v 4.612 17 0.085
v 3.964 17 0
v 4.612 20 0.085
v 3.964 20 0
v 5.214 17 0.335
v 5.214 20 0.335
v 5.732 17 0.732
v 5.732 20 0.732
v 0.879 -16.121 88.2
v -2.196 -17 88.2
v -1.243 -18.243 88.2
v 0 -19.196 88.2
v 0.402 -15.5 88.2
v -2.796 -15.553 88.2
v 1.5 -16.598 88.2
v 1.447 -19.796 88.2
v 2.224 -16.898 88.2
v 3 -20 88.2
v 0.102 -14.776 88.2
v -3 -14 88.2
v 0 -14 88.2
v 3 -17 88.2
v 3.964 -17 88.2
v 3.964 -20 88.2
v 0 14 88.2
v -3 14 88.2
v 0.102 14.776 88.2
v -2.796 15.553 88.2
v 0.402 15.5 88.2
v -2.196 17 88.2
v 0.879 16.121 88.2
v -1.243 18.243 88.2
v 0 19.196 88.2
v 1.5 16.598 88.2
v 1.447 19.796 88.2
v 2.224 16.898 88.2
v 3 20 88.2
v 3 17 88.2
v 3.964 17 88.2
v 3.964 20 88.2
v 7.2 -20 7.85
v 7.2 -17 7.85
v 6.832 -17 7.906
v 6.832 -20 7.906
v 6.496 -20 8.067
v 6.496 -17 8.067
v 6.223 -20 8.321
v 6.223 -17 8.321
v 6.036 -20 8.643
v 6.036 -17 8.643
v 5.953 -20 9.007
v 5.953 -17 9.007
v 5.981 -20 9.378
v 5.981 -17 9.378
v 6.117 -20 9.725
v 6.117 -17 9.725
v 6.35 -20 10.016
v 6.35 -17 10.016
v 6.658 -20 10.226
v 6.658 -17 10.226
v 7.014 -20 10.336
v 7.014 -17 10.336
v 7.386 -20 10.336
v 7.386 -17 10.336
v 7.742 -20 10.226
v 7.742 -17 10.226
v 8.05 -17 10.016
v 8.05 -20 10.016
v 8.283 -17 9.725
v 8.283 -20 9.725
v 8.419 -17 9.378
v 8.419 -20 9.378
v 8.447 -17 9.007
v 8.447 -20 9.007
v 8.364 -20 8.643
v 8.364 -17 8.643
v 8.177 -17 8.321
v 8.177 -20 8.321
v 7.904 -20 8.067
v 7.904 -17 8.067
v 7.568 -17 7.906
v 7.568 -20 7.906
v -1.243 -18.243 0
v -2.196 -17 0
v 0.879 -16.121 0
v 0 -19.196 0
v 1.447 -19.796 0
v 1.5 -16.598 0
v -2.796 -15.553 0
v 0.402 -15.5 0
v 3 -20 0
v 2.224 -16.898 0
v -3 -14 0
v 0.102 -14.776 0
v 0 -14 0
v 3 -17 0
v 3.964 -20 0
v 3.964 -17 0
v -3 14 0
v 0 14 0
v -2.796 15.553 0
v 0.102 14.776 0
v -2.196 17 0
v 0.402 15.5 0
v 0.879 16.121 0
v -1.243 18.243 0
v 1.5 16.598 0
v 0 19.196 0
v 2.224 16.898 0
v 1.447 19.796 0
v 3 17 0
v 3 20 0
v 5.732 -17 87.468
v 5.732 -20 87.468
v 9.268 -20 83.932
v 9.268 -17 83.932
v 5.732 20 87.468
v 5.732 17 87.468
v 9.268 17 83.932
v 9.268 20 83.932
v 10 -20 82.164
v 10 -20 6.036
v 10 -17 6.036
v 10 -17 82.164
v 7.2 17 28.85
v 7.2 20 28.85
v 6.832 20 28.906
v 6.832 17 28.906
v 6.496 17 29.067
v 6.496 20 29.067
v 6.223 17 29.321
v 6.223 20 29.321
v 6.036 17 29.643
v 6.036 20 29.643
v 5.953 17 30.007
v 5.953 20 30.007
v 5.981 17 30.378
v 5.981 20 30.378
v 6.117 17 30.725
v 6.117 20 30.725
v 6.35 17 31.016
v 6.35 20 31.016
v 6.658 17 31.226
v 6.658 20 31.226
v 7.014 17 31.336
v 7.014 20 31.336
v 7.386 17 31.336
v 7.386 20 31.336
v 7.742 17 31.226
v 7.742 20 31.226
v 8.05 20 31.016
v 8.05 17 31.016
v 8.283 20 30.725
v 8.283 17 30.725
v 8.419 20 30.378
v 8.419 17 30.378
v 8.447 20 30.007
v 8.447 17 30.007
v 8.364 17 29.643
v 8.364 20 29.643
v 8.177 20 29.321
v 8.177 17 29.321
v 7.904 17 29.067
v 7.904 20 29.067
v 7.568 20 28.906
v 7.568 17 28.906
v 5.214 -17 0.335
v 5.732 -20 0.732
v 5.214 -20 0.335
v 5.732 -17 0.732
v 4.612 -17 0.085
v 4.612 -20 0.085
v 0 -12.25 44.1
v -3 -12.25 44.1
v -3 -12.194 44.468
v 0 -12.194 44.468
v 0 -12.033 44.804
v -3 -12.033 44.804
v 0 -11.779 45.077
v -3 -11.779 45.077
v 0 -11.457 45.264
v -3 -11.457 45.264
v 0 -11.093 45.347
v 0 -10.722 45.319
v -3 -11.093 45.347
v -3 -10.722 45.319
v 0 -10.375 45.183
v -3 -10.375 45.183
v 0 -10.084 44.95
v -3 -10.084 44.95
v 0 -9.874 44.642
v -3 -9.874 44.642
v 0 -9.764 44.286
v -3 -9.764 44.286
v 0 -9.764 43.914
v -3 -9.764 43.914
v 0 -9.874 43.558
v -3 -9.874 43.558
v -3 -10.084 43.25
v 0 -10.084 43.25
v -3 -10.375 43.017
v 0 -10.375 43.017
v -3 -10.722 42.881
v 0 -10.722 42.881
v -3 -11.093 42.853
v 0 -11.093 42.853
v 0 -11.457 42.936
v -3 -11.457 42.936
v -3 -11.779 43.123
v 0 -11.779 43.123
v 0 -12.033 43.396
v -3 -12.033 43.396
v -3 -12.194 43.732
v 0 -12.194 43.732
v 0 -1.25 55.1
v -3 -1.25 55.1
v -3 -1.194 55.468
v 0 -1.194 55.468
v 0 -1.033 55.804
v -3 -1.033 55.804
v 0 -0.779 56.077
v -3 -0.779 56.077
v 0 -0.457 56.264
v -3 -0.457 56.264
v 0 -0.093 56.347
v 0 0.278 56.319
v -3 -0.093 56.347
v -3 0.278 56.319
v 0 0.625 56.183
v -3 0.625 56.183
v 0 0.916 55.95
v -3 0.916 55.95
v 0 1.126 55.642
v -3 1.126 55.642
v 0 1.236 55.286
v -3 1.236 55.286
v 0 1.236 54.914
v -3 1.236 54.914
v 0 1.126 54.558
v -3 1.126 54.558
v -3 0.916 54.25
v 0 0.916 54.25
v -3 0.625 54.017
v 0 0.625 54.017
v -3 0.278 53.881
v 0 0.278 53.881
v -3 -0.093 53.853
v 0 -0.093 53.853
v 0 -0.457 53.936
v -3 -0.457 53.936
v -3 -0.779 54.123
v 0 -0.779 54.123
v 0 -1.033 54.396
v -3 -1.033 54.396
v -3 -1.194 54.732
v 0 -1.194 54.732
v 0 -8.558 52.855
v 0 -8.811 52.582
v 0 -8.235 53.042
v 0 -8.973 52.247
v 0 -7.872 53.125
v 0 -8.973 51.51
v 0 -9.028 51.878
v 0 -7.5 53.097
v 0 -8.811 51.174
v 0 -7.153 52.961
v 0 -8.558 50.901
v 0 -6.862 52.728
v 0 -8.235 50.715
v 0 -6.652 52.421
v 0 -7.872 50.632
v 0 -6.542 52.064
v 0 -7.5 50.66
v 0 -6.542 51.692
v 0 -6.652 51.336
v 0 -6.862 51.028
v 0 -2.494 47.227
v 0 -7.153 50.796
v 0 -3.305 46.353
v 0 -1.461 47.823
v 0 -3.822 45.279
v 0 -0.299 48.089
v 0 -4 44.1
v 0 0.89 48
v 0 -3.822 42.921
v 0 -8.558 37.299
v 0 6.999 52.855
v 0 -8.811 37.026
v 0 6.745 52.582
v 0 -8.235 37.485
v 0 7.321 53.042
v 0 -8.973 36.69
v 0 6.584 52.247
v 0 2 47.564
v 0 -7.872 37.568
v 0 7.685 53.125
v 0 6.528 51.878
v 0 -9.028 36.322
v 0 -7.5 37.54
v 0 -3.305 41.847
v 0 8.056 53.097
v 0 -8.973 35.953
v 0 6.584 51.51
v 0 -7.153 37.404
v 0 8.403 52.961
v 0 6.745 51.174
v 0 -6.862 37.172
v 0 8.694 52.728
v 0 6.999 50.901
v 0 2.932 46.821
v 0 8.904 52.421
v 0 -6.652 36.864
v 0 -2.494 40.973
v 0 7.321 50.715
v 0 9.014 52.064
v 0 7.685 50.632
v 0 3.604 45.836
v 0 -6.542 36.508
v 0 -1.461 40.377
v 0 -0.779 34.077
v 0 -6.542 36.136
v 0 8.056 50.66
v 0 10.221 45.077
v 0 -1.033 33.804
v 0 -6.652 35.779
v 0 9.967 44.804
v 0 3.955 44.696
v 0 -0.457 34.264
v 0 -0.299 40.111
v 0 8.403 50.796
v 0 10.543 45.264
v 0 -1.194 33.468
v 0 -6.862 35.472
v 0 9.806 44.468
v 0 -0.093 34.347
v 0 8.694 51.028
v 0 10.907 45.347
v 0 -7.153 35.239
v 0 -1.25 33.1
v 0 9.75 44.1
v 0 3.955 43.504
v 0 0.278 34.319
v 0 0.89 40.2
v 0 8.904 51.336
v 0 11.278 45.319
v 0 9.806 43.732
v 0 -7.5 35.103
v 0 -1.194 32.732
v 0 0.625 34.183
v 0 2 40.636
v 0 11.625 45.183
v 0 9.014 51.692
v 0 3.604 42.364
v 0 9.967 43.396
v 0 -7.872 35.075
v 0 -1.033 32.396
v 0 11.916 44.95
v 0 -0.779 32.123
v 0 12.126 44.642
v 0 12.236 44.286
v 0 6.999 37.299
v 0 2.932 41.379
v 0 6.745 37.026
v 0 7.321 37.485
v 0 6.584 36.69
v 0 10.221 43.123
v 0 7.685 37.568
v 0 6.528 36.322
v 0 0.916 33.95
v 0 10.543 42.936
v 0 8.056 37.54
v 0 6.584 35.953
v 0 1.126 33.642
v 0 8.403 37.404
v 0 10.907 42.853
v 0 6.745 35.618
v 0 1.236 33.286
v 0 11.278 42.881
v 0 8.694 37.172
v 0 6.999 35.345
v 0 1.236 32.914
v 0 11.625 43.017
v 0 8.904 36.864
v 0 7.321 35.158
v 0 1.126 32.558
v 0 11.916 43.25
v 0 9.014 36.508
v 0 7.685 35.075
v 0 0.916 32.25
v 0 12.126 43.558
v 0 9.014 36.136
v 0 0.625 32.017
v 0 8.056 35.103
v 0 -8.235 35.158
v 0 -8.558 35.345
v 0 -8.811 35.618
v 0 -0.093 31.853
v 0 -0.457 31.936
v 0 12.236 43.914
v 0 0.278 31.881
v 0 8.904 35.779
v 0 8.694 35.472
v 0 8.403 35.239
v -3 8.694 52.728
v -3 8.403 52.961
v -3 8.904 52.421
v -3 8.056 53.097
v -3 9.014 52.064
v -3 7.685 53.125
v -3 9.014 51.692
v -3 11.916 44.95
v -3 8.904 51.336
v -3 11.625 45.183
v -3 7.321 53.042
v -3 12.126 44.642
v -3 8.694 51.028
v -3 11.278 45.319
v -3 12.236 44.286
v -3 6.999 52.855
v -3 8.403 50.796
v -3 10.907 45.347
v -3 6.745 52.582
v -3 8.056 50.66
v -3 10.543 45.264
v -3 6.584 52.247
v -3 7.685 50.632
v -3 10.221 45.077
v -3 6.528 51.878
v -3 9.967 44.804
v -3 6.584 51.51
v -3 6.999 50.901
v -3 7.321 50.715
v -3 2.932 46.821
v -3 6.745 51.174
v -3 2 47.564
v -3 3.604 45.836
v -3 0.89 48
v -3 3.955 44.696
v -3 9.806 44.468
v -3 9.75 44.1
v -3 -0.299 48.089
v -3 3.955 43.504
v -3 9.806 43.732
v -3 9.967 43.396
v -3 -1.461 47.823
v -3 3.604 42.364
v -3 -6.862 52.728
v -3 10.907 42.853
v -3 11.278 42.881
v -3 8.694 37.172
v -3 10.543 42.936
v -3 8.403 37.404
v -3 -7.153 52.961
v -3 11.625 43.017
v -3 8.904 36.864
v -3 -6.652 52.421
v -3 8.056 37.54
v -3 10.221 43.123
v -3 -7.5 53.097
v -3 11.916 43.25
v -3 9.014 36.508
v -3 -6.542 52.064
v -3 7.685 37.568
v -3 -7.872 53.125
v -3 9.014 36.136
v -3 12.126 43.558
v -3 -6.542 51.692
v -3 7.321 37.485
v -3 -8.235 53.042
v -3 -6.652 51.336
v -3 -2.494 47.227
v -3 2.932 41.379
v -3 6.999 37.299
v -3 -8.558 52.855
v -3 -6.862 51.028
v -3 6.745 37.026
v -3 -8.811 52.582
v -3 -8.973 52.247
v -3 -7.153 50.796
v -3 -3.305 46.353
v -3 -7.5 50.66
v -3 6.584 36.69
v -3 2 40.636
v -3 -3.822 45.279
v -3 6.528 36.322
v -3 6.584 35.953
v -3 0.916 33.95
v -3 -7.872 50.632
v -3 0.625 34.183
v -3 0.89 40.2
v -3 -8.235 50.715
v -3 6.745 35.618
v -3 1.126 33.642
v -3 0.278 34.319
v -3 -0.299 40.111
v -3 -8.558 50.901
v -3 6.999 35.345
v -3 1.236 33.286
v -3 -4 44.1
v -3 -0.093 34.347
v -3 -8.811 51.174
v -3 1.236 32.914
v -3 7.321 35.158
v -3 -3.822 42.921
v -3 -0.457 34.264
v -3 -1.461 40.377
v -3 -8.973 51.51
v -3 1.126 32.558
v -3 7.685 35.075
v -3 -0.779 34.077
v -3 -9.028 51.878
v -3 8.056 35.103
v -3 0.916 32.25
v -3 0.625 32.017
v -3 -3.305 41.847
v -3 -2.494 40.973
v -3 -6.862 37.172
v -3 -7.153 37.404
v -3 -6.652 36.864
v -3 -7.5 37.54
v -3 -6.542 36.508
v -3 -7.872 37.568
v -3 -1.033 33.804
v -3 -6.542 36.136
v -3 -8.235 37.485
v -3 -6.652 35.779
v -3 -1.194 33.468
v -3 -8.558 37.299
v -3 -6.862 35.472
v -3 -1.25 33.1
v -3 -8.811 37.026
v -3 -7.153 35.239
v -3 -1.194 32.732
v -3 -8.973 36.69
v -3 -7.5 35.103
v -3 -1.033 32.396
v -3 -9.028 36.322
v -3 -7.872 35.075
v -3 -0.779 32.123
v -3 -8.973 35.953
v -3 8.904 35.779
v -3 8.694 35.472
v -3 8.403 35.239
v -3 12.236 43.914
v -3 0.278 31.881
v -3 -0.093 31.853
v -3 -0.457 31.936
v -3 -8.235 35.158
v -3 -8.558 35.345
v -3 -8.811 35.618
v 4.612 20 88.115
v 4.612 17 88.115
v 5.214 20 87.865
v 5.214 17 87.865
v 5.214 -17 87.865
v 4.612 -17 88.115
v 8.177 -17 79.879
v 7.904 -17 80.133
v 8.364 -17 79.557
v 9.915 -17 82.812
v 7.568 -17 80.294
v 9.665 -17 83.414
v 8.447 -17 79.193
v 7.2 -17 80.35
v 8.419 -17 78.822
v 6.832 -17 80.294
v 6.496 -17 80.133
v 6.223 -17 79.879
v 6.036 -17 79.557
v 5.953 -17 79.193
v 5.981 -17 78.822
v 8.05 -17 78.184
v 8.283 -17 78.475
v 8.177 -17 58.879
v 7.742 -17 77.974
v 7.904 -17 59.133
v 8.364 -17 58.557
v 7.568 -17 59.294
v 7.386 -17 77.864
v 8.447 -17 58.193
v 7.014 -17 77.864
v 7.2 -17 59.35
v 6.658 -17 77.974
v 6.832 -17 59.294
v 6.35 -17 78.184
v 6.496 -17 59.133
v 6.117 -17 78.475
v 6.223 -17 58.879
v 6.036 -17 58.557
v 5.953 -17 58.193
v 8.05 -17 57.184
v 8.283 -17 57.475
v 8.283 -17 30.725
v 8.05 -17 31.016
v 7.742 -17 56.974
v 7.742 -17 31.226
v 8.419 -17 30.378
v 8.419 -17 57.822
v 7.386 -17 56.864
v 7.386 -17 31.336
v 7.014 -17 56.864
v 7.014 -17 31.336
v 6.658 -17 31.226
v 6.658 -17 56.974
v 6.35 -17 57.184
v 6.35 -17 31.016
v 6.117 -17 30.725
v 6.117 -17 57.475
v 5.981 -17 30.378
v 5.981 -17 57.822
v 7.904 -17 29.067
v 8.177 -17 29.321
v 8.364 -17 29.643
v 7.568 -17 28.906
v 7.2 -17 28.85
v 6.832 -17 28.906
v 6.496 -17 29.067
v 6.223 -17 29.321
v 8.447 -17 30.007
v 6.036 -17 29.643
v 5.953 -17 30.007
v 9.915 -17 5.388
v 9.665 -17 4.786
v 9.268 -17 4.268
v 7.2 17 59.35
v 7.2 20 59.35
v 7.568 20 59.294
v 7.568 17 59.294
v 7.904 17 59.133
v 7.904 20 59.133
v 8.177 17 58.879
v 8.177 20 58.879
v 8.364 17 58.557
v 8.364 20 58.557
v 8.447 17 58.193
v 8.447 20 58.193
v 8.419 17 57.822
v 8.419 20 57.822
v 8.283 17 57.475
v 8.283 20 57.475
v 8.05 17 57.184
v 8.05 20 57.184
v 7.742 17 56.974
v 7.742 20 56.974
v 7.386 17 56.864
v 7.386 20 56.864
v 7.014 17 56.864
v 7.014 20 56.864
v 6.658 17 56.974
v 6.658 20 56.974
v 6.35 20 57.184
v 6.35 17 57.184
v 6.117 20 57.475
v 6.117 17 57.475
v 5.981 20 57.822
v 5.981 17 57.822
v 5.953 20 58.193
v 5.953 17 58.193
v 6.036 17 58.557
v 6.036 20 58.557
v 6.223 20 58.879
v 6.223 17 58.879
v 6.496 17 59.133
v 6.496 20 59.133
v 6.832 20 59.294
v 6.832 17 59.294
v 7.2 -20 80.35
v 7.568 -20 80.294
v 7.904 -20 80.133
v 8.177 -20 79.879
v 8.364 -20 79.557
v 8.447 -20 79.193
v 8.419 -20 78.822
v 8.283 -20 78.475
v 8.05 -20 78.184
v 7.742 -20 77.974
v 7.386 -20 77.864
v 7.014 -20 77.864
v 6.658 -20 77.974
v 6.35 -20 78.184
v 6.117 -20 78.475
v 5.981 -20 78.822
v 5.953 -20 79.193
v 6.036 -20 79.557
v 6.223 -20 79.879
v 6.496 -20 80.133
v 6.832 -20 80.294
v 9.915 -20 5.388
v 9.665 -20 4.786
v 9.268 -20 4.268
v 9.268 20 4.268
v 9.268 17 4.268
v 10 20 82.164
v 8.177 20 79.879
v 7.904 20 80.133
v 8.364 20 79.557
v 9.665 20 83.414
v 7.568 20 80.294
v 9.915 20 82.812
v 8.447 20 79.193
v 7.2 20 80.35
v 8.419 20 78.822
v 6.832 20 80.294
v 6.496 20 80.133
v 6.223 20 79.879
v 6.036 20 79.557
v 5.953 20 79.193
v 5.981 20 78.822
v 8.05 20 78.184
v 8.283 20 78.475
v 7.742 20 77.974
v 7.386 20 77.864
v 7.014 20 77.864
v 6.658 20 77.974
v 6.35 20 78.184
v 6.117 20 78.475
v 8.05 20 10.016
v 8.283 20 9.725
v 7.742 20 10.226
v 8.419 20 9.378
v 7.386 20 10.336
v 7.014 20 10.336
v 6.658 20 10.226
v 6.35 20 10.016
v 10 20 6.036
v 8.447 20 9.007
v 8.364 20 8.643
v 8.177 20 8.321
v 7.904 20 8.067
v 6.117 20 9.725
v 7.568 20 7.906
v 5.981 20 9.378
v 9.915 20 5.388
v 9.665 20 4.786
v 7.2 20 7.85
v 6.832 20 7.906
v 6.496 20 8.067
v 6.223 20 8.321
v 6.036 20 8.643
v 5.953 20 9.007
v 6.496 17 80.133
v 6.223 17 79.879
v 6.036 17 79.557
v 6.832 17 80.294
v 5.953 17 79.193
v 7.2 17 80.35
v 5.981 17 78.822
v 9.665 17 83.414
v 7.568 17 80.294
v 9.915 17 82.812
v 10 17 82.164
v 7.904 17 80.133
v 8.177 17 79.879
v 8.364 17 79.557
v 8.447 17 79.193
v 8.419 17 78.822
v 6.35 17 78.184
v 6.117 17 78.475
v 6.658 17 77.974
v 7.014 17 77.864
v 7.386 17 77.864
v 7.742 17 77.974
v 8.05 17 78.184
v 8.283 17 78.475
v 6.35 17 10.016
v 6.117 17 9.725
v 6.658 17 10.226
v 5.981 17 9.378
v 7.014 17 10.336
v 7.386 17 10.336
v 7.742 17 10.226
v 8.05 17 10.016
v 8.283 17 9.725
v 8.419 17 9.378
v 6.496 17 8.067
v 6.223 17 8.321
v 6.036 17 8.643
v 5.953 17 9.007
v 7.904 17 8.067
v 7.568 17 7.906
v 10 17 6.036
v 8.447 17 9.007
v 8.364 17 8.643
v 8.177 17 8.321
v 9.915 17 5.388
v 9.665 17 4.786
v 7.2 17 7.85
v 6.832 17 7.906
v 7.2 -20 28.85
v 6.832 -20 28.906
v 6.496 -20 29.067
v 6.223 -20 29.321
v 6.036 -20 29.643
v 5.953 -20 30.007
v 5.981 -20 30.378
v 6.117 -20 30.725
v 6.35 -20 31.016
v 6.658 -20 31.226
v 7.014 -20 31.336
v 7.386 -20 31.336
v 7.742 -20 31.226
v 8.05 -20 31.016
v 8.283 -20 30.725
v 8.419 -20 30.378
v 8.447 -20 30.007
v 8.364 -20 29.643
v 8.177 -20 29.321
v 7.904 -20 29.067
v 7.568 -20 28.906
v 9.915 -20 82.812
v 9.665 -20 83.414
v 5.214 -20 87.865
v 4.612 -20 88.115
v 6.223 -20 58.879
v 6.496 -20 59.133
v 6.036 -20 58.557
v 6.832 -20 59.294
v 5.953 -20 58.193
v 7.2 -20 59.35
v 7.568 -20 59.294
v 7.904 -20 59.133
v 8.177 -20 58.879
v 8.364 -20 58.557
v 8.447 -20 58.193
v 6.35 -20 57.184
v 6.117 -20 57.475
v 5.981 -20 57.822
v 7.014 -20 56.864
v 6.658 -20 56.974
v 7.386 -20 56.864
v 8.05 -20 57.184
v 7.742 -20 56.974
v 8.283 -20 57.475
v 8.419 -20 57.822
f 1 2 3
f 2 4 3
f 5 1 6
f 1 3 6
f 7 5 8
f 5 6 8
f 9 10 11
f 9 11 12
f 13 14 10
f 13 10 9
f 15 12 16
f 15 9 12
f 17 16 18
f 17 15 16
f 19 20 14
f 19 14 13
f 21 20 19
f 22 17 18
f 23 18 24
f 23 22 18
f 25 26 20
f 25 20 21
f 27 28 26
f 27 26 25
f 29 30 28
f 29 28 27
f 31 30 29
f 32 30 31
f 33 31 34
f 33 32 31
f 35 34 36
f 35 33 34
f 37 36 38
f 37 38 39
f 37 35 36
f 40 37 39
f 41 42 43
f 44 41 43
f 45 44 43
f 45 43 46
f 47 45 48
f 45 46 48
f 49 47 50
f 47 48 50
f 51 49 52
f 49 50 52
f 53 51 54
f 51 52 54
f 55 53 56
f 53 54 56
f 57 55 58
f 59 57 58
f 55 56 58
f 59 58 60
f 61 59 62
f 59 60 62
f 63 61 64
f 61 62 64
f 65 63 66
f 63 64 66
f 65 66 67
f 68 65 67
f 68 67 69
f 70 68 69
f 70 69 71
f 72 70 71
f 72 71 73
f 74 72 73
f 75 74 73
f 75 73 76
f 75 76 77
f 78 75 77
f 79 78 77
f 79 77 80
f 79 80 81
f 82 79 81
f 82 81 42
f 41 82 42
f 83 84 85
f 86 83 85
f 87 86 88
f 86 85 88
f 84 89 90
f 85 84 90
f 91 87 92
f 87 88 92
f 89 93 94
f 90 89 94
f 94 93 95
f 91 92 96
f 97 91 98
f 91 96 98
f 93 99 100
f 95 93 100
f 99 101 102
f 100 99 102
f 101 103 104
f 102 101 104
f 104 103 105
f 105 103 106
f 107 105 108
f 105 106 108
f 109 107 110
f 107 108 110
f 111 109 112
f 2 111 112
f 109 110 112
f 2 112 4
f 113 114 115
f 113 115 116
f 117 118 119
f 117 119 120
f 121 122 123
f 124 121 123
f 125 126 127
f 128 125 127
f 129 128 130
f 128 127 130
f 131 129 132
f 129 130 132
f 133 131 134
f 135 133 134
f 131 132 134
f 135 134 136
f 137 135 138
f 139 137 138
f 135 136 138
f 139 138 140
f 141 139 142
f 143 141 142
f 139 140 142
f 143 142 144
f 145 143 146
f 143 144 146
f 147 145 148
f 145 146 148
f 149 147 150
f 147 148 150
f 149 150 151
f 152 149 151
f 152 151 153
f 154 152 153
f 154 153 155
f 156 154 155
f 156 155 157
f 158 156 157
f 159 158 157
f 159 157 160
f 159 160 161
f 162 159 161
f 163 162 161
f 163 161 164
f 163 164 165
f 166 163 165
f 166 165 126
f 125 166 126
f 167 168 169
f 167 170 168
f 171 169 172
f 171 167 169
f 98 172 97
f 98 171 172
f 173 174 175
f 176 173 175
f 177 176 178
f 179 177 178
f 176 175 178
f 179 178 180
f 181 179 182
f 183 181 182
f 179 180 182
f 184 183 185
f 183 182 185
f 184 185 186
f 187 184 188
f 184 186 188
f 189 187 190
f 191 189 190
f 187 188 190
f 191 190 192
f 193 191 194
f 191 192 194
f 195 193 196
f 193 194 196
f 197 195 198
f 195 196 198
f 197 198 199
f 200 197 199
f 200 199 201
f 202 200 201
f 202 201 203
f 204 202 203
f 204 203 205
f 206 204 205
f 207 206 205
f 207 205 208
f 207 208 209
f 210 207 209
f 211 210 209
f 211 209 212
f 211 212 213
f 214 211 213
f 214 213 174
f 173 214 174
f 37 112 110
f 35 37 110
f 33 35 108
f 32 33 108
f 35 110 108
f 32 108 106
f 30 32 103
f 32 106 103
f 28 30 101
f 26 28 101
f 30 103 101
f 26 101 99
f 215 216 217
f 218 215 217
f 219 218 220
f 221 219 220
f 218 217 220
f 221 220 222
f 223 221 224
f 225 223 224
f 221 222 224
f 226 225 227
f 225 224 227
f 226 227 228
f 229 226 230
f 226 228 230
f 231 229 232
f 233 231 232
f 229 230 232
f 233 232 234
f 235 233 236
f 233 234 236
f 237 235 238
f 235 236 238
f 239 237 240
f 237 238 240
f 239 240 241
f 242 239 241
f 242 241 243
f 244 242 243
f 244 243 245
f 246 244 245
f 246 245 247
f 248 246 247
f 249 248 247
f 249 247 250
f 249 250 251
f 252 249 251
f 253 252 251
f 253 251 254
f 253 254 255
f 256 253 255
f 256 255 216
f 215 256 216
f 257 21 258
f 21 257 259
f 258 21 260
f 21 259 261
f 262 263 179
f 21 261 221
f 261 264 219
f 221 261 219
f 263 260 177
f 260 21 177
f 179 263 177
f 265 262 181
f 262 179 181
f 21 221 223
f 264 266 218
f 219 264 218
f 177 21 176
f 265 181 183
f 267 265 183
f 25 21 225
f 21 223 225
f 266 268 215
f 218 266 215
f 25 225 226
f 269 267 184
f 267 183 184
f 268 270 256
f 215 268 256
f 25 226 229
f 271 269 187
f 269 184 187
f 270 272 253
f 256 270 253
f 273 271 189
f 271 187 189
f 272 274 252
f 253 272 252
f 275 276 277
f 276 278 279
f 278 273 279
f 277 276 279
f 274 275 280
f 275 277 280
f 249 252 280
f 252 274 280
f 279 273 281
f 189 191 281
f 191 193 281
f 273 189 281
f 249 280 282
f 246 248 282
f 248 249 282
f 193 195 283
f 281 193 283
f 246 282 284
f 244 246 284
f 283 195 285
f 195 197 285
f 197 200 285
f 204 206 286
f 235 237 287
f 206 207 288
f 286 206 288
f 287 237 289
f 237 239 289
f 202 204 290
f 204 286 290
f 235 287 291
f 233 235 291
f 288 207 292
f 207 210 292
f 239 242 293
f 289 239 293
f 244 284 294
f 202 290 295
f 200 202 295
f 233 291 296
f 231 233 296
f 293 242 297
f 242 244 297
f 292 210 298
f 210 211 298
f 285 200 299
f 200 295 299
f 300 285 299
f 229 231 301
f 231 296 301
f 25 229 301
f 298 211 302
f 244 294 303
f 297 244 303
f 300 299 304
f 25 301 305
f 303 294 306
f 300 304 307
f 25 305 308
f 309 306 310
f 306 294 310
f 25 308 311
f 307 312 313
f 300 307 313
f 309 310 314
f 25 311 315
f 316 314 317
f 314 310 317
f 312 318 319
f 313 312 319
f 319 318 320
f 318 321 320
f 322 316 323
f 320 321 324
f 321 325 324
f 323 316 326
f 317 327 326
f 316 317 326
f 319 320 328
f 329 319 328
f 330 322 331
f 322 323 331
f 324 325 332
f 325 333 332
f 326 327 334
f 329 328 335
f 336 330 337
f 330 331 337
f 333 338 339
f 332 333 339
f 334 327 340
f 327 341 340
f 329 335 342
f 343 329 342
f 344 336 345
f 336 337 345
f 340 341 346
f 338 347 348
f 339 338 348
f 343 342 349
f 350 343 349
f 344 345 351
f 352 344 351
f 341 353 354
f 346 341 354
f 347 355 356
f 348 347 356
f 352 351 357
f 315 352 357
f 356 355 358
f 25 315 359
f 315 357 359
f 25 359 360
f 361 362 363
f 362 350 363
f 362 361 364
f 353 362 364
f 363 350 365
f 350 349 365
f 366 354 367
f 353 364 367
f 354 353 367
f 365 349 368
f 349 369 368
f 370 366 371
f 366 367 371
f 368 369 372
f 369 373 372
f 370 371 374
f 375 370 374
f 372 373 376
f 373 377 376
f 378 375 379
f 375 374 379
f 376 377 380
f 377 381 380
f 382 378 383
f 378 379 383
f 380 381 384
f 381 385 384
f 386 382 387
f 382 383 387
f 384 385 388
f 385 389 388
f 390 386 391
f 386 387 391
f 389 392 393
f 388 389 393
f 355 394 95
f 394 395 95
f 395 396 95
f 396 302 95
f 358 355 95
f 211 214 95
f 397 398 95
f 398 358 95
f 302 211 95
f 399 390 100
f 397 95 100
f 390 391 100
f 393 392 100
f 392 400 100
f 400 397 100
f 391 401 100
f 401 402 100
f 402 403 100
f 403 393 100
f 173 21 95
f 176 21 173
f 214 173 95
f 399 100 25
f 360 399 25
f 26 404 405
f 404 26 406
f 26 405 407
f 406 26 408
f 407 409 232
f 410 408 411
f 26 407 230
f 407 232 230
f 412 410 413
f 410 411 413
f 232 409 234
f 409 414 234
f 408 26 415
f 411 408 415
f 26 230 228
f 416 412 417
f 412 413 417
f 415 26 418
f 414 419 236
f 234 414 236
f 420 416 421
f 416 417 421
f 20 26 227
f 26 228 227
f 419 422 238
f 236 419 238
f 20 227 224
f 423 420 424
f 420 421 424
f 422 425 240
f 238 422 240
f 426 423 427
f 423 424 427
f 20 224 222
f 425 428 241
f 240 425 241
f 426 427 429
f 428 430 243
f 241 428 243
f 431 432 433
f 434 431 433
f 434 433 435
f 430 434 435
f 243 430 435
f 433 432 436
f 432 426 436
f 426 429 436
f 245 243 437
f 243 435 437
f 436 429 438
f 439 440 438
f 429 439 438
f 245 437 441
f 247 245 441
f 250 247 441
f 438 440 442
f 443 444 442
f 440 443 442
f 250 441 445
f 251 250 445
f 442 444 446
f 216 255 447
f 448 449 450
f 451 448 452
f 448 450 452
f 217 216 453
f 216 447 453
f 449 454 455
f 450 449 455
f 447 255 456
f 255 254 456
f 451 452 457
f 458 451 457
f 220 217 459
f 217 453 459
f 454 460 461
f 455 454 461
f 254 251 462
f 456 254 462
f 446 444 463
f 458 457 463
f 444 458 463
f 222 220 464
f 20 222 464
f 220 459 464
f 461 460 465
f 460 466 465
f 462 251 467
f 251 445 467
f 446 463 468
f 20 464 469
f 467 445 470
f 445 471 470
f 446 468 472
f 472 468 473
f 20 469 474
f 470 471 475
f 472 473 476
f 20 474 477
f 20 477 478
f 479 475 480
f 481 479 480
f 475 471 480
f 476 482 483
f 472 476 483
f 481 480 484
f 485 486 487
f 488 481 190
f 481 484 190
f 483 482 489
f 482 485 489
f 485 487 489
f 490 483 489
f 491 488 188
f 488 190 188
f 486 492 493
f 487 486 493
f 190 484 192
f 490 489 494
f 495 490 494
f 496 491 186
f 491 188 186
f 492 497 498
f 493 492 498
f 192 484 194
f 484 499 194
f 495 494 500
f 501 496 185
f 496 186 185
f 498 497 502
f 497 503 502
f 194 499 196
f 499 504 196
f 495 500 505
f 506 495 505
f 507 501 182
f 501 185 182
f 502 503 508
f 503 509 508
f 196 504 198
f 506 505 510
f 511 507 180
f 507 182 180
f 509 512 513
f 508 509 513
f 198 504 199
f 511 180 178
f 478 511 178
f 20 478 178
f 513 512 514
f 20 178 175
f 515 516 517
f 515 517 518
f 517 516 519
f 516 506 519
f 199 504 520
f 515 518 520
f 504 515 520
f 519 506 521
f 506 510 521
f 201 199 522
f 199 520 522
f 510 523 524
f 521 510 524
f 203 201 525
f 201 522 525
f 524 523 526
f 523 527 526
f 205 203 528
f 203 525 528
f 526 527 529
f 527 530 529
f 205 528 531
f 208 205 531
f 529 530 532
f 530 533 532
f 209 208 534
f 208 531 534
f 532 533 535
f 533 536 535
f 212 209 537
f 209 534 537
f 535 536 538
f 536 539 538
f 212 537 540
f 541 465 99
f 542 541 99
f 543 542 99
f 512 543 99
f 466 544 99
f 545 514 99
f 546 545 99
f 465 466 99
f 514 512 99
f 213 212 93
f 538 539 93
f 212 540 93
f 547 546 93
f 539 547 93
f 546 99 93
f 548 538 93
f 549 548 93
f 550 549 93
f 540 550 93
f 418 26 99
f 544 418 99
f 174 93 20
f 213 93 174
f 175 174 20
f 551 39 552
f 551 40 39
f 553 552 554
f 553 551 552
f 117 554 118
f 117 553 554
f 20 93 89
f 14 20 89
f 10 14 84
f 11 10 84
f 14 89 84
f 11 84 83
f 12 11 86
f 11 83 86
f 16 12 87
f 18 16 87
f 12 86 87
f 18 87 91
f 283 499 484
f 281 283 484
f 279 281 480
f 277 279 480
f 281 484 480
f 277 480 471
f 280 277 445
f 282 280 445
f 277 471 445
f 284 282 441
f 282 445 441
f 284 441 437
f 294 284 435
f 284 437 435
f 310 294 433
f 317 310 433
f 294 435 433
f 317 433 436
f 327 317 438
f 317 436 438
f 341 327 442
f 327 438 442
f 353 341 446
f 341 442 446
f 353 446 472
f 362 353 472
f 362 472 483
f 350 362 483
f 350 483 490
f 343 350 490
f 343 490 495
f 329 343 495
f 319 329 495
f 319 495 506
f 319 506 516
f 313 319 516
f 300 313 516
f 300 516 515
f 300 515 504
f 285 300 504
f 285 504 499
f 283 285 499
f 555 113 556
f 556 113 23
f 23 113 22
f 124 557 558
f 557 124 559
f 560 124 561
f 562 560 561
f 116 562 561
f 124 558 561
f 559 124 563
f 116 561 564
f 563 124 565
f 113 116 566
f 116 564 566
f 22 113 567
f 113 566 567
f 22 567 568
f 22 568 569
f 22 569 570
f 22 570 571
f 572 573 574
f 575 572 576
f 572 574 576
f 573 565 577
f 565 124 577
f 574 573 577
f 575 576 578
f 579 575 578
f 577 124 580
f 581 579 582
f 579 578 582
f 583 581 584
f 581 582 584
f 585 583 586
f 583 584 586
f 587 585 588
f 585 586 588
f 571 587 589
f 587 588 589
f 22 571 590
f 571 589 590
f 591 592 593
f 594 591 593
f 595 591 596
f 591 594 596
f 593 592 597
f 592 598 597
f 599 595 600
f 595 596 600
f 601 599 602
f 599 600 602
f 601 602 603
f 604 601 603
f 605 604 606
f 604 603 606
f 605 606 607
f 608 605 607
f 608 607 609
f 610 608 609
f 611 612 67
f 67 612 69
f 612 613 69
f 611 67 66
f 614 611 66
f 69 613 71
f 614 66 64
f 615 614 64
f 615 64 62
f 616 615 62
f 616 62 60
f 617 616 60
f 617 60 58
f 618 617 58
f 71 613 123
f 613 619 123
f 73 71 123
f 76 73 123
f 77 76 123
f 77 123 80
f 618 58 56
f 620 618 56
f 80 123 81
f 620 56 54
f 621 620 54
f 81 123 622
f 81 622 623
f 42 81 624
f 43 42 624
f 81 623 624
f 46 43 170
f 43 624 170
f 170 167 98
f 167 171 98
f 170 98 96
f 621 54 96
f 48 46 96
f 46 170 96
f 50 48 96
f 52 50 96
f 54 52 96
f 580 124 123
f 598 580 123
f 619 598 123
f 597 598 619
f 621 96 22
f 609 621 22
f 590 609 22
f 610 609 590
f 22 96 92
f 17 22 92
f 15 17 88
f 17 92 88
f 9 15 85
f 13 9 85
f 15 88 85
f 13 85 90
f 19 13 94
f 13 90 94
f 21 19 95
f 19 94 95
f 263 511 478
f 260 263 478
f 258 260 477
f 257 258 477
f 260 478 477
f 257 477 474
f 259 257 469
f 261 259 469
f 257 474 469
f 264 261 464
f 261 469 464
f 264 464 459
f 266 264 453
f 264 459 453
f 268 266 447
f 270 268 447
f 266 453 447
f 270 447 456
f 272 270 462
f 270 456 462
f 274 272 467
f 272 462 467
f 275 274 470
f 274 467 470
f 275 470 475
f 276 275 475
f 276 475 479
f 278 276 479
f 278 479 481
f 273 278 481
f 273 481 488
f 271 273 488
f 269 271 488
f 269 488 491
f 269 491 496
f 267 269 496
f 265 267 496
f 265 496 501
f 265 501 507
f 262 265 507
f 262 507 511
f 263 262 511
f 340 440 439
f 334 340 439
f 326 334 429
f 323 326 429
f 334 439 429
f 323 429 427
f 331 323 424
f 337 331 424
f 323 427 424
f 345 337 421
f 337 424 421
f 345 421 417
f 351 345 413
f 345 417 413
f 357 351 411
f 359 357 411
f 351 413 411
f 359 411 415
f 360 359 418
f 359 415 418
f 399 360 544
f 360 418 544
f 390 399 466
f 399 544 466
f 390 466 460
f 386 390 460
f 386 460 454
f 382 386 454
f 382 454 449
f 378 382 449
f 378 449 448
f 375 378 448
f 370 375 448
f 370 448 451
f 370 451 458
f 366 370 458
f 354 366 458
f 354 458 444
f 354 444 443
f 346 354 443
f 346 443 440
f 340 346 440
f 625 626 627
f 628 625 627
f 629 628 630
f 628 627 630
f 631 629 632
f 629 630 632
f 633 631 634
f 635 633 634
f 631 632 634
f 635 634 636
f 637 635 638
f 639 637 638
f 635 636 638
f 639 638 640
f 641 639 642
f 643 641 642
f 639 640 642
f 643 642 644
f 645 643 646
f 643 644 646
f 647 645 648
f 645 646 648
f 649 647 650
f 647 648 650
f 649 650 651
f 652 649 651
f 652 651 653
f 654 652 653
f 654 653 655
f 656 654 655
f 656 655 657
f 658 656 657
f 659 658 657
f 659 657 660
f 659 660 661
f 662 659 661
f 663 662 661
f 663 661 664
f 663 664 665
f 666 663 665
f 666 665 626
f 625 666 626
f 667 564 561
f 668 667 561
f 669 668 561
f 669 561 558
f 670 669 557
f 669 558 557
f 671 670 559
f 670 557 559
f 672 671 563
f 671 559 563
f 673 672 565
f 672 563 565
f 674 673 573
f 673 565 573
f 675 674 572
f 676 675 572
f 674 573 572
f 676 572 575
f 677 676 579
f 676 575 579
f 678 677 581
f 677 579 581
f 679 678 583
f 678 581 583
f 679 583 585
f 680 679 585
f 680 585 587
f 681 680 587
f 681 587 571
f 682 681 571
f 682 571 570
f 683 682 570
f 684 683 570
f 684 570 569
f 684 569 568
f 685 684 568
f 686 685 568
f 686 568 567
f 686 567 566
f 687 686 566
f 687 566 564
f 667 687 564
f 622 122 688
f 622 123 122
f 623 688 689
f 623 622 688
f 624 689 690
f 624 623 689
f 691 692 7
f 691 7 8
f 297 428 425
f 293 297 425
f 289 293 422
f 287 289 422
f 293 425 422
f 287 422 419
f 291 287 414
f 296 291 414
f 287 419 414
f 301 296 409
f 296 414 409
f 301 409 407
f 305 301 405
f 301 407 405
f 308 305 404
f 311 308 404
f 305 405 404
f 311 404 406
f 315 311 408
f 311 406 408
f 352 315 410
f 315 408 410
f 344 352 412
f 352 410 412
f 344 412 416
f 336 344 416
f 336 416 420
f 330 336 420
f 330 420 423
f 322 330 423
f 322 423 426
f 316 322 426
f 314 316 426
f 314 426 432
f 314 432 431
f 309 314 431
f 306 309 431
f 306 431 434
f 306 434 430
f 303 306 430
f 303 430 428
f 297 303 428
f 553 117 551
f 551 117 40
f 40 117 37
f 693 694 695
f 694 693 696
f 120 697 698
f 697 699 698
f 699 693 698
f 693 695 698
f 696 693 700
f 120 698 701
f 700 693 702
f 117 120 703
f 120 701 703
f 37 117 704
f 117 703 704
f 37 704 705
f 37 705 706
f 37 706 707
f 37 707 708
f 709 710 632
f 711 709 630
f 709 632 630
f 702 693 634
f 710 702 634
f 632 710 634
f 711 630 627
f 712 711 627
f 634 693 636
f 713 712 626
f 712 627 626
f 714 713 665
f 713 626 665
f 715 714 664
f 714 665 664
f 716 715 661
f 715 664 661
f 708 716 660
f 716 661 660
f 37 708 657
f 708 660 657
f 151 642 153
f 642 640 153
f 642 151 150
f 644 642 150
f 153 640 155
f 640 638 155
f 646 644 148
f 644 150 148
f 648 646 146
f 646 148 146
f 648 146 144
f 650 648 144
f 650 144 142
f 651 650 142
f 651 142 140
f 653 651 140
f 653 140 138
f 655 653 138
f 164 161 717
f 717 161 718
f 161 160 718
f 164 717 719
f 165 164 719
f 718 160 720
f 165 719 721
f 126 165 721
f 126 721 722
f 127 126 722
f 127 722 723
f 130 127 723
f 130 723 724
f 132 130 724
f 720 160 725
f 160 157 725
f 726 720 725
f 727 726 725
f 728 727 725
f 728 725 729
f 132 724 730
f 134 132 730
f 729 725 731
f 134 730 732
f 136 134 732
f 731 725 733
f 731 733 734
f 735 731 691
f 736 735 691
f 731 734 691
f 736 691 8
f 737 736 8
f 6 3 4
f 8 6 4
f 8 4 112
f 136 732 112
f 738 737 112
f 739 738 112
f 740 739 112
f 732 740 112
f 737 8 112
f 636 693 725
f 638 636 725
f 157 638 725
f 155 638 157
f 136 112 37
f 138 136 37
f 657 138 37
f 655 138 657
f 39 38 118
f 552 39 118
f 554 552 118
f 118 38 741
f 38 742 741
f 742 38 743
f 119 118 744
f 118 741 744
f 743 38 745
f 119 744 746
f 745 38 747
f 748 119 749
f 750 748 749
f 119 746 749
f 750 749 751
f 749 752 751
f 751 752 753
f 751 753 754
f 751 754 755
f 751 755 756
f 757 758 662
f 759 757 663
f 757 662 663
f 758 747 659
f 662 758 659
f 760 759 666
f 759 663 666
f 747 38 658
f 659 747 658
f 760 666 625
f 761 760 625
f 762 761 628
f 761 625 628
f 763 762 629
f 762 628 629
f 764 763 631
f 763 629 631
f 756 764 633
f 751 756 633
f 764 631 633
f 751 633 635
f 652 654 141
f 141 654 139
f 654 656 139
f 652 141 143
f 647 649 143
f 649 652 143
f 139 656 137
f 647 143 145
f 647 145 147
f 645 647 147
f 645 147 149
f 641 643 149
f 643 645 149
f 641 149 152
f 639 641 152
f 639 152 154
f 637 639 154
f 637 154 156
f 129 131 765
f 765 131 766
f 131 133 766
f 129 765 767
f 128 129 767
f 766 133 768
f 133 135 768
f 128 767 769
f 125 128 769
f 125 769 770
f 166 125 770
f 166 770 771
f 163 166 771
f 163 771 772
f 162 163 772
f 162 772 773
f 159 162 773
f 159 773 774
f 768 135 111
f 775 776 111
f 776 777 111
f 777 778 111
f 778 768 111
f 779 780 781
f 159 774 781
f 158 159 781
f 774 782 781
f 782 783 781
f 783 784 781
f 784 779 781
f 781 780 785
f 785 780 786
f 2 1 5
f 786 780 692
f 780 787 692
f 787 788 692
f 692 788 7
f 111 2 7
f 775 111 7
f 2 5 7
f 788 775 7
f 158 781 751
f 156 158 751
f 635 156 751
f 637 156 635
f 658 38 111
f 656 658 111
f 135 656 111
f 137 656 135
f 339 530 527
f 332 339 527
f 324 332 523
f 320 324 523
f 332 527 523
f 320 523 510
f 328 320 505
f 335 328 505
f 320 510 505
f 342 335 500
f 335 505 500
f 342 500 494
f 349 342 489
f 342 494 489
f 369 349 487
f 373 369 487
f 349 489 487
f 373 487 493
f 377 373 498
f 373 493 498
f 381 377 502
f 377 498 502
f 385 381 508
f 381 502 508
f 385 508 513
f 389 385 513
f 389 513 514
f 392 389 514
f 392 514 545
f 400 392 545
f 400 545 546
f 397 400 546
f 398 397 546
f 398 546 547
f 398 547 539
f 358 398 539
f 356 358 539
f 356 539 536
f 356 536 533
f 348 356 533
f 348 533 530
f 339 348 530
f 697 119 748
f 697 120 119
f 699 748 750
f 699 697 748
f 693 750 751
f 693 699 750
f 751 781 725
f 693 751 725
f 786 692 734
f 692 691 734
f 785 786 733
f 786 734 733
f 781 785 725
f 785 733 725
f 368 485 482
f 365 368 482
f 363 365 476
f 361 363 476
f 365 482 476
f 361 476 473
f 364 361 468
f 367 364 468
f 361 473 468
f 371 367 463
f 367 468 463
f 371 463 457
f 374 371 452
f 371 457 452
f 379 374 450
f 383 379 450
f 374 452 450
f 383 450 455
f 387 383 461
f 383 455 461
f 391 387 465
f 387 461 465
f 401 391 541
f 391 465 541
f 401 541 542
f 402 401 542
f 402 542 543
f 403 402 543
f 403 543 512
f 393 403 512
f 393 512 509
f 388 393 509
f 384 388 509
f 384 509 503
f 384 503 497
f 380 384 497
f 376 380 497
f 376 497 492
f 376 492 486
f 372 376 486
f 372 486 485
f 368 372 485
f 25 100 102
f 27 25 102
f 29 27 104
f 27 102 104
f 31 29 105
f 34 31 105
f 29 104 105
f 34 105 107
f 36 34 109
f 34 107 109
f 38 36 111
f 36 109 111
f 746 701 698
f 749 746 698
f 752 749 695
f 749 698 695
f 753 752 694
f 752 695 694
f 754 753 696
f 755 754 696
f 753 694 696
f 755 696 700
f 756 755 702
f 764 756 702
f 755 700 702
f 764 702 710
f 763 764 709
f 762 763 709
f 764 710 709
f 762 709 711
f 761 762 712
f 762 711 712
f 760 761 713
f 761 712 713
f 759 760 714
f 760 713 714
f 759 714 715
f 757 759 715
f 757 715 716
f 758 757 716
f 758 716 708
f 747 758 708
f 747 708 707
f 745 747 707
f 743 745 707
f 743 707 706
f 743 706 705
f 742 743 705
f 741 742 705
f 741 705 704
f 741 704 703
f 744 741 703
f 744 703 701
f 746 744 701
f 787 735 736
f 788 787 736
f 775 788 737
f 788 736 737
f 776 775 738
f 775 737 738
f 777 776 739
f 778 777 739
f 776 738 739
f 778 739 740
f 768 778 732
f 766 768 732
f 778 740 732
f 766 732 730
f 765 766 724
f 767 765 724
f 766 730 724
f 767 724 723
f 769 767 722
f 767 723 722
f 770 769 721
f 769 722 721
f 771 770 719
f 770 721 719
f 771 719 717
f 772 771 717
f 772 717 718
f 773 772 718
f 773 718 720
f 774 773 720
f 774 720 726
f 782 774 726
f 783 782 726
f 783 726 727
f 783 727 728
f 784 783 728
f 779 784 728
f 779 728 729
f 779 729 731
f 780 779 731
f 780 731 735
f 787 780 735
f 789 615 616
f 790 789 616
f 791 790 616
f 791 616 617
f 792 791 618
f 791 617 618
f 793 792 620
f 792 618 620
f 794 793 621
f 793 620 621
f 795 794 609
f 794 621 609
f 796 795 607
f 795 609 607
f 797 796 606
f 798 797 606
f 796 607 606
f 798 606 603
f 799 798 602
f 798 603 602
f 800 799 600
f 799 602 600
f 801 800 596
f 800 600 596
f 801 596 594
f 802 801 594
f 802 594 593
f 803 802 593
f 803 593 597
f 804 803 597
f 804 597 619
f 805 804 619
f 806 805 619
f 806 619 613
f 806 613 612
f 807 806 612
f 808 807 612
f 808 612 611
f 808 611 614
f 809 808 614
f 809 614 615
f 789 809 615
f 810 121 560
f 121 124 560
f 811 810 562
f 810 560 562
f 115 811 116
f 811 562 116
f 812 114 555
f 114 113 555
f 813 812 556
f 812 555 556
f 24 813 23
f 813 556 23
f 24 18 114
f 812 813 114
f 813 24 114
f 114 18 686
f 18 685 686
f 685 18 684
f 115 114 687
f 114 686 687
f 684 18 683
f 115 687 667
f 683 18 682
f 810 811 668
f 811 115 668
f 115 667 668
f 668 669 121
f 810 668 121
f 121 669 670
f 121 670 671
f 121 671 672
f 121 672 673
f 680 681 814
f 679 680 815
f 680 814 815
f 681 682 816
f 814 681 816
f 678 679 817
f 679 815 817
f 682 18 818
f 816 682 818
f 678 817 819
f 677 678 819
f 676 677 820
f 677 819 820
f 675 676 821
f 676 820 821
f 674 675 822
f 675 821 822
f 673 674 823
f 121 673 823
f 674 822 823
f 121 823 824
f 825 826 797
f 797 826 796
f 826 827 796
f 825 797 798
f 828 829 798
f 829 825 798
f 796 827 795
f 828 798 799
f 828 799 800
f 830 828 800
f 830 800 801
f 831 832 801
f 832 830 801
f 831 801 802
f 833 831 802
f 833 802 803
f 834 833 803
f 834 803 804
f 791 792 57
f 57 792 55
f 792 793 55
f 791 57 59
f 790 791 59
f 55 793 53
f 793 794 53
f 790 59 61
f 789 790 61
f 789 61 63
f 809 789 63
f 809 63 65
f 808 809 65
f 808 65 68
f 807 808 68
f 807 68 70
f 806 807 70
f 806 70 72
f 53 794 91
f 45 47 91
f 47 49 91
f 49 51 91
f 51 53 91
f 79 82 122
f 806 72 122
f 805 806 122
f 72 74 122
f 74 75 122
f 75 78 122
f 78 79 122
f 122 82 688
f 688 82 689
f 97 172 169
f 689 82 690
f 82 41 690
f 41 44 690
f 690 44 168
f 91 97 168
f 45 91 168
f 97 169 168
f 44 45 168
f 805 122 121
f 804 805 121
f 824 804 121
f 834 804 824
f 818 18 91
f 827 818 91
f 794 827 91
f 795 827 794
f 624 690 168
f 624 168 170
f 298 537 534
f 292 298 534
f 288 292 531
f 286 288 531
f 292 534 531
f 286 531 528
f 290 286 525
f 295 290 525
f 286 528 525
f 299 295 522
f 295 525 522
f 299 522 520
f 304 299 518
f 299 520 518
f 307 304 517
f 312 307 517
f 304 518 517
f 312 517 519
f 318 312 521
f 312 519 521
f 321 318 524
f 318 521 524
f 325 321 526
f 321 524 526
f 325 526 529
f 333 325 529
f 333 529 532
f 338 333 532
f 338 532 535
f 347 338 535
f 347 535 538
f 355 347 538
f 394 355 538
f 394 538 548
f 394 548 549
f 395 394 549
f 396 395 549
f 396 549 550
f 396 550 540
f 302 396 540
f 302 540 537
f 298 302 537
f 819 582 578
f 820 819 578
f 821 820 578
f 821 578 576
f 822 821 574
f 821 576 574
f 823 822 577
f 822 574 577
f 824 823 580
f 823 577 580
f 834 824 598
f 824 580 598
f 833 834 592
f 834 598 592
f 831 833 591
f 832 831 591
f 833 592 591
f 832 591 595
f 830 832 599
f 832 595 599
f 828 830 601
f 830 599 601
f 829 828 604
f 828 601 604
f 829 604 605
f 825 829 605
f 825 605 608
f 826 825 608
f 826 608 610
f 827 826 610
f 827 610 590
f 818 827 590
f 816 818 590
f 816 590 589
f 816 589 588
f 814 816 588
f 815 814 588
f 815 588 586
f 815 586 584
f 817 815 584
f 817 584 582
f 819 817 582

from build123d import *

# Parameters (mm, degrees)
BASE_FLANGE1_DEPTH = 88.2
CHAMFER1_SIZE      = 5
FILLET1_R          = 2.5
SKETCH4_R          = 4
CUT_EXTRUDE1_DEPTH = 92.368703613
SKETCH5_R          = 1.25
CUT_EXTRUDE2_DEPTH = 92.368703613
SKETCH6_R          = 1.25
CUT_EXTRUDE3_DEPTH = 98.361388651


# Sheet-metal steps are written as plain solids
with BuildPart() as part:
    # Sketch1 → Base-Flange1 (new body)
    with BuildSketch(Plane.XY):
        with BuildLine():
            Line((10, -17), (3, -17))
            ThreePointArc((3, -17), (0.878679656, -16.121320344), (0, -14))
            Line((0, -14), (0, 0))
            Line((0, 0), (0, 14))
            ThreePointArc((0, 14), (0.878679656, 16.121320344), (3, 17))
            Line((3, 17), (10, 17))
            Line((10, 17), (10, 20))
            Line((10, 20), (3, 20))
            ThreePointArc((3, 20), (-1.242640687, 18.242640687), (-3, 14))
            Line((-3, 14), (-3, 0))
            Line((-3, 0), (-3, -14))
            ThreePointArc((-3, -14), (-1.242640687, -18.242640687), (3, -20))
            Line((3, -20), (10, -20))
            Line((10, -20), (10, -17))
        make_face()
    extrude(amount=BASE_FLANGE1_DEPTH)

    # Chamfer1
    chamfer1_edges = [part.edges().sort_by_distance(p)[0] for p in [
        (10, 18.5, 0),
        (10, -18.5, 0),
        (10, 18.5, 88.2),
        (10, -18.5, 88.2),
    ]]
    chamfer(chamfer1_edges, length=CHAMFER1_SIZE)

    # Fillet1
    fillet1_edges = [part.edges().sort_by_distance(p)[0] for p in [
        (5, -18.5, 0),
        (10, -18.5, 83.2),
        (10, -18.5, 5),
        (5, 18.5, 0),
        (10, 18.5, 83.2),
        (10, 18.5, 5),
        (5, -18.5, 88.2),
        (5, 18.5, 88.2),
    ]]
    fillet(fillet1_edges, radius=FILLET1_R)

    # Sketch4 → Cut-Extrude1 (cut, through all)
    with BuildSketch(Plane.ZY.offset(3)):
        with Locations(Location((44.1, 0, 0), (0, 0, 270))):
            Circle(SKETCH4_R)
    extrude(amount=-CUT_EXTRUDE1_DEPTH, mode=Mode.SUBTRACT)

    # Sketch5 → Cut-Extrude2 (cut, through all)
    with BuildSketch(Plane.ZY.offset(3)):
        with Locations(Location((44.1, 11, 0), (0, 0, 270))):
            Circle(SKETCH5_R)
        with Locations(Location((51.878174593, 7.778174593, 0), (0, 0, 270))):
            Circle(SKETCH5_R)
        with Locations(Location((55.1, 0, 0), (0, 0, 270))):
            Circle(SKETCH5_R)
        with Locations(Location((51.878174593, -7.778174593, 0), (0, 0, 270))):
            Circle(SKETCH5_R)
        with Locations(Location((44.1, -11, 0), (0, 0, 270))):
            Circle(SKETCH5_R)
        with Locations(Location((36.321825407, -7.778174593, 0), (0, 0, 270))):
            Circle(SKETCH5_R)
        with Locations(Location((33.1, 0, 0), (0, 0, 270))):
            Circle(SKETCH5_R)
        with Locations(Location((36.321825407, 7.778174593, 0), (0, 0, 270))):
            Circle(SKETCH5_R)
    extrude(amount=-CUT_EXTRUDE2_DEPTH, mode=Mode.SUBTRACT)

    # Sketch6 → Cut-Extrude3 (cut, through all)
    with BuildSketch(Plane(origin=(0, 20, 0), x_dir=(1, 0, 0), z_dir=(0, 1, 0))):
        with Locations(Location((7.2, -79.1, 0), (0, 0, 270))):
            Circle(SKETCH6_R)
        with Locations(Location((7.2, -58.1, 0), (0, 0, 270))):
            Circle(SKETCH6_R)
        with Locations(Location((7.2, -30.1, 0), (0, 0, 90))):
            Circle(SKETCH6_R)
        with Locations(Location((7.2, -9.1, 0), (0, 0, 90))):
            Circle(SKETCH6_R)
    extrude(amount=-CUT_EXTRUDE3_DEPTH, mode=Mode.SUBTRACT)


solid = part.part
